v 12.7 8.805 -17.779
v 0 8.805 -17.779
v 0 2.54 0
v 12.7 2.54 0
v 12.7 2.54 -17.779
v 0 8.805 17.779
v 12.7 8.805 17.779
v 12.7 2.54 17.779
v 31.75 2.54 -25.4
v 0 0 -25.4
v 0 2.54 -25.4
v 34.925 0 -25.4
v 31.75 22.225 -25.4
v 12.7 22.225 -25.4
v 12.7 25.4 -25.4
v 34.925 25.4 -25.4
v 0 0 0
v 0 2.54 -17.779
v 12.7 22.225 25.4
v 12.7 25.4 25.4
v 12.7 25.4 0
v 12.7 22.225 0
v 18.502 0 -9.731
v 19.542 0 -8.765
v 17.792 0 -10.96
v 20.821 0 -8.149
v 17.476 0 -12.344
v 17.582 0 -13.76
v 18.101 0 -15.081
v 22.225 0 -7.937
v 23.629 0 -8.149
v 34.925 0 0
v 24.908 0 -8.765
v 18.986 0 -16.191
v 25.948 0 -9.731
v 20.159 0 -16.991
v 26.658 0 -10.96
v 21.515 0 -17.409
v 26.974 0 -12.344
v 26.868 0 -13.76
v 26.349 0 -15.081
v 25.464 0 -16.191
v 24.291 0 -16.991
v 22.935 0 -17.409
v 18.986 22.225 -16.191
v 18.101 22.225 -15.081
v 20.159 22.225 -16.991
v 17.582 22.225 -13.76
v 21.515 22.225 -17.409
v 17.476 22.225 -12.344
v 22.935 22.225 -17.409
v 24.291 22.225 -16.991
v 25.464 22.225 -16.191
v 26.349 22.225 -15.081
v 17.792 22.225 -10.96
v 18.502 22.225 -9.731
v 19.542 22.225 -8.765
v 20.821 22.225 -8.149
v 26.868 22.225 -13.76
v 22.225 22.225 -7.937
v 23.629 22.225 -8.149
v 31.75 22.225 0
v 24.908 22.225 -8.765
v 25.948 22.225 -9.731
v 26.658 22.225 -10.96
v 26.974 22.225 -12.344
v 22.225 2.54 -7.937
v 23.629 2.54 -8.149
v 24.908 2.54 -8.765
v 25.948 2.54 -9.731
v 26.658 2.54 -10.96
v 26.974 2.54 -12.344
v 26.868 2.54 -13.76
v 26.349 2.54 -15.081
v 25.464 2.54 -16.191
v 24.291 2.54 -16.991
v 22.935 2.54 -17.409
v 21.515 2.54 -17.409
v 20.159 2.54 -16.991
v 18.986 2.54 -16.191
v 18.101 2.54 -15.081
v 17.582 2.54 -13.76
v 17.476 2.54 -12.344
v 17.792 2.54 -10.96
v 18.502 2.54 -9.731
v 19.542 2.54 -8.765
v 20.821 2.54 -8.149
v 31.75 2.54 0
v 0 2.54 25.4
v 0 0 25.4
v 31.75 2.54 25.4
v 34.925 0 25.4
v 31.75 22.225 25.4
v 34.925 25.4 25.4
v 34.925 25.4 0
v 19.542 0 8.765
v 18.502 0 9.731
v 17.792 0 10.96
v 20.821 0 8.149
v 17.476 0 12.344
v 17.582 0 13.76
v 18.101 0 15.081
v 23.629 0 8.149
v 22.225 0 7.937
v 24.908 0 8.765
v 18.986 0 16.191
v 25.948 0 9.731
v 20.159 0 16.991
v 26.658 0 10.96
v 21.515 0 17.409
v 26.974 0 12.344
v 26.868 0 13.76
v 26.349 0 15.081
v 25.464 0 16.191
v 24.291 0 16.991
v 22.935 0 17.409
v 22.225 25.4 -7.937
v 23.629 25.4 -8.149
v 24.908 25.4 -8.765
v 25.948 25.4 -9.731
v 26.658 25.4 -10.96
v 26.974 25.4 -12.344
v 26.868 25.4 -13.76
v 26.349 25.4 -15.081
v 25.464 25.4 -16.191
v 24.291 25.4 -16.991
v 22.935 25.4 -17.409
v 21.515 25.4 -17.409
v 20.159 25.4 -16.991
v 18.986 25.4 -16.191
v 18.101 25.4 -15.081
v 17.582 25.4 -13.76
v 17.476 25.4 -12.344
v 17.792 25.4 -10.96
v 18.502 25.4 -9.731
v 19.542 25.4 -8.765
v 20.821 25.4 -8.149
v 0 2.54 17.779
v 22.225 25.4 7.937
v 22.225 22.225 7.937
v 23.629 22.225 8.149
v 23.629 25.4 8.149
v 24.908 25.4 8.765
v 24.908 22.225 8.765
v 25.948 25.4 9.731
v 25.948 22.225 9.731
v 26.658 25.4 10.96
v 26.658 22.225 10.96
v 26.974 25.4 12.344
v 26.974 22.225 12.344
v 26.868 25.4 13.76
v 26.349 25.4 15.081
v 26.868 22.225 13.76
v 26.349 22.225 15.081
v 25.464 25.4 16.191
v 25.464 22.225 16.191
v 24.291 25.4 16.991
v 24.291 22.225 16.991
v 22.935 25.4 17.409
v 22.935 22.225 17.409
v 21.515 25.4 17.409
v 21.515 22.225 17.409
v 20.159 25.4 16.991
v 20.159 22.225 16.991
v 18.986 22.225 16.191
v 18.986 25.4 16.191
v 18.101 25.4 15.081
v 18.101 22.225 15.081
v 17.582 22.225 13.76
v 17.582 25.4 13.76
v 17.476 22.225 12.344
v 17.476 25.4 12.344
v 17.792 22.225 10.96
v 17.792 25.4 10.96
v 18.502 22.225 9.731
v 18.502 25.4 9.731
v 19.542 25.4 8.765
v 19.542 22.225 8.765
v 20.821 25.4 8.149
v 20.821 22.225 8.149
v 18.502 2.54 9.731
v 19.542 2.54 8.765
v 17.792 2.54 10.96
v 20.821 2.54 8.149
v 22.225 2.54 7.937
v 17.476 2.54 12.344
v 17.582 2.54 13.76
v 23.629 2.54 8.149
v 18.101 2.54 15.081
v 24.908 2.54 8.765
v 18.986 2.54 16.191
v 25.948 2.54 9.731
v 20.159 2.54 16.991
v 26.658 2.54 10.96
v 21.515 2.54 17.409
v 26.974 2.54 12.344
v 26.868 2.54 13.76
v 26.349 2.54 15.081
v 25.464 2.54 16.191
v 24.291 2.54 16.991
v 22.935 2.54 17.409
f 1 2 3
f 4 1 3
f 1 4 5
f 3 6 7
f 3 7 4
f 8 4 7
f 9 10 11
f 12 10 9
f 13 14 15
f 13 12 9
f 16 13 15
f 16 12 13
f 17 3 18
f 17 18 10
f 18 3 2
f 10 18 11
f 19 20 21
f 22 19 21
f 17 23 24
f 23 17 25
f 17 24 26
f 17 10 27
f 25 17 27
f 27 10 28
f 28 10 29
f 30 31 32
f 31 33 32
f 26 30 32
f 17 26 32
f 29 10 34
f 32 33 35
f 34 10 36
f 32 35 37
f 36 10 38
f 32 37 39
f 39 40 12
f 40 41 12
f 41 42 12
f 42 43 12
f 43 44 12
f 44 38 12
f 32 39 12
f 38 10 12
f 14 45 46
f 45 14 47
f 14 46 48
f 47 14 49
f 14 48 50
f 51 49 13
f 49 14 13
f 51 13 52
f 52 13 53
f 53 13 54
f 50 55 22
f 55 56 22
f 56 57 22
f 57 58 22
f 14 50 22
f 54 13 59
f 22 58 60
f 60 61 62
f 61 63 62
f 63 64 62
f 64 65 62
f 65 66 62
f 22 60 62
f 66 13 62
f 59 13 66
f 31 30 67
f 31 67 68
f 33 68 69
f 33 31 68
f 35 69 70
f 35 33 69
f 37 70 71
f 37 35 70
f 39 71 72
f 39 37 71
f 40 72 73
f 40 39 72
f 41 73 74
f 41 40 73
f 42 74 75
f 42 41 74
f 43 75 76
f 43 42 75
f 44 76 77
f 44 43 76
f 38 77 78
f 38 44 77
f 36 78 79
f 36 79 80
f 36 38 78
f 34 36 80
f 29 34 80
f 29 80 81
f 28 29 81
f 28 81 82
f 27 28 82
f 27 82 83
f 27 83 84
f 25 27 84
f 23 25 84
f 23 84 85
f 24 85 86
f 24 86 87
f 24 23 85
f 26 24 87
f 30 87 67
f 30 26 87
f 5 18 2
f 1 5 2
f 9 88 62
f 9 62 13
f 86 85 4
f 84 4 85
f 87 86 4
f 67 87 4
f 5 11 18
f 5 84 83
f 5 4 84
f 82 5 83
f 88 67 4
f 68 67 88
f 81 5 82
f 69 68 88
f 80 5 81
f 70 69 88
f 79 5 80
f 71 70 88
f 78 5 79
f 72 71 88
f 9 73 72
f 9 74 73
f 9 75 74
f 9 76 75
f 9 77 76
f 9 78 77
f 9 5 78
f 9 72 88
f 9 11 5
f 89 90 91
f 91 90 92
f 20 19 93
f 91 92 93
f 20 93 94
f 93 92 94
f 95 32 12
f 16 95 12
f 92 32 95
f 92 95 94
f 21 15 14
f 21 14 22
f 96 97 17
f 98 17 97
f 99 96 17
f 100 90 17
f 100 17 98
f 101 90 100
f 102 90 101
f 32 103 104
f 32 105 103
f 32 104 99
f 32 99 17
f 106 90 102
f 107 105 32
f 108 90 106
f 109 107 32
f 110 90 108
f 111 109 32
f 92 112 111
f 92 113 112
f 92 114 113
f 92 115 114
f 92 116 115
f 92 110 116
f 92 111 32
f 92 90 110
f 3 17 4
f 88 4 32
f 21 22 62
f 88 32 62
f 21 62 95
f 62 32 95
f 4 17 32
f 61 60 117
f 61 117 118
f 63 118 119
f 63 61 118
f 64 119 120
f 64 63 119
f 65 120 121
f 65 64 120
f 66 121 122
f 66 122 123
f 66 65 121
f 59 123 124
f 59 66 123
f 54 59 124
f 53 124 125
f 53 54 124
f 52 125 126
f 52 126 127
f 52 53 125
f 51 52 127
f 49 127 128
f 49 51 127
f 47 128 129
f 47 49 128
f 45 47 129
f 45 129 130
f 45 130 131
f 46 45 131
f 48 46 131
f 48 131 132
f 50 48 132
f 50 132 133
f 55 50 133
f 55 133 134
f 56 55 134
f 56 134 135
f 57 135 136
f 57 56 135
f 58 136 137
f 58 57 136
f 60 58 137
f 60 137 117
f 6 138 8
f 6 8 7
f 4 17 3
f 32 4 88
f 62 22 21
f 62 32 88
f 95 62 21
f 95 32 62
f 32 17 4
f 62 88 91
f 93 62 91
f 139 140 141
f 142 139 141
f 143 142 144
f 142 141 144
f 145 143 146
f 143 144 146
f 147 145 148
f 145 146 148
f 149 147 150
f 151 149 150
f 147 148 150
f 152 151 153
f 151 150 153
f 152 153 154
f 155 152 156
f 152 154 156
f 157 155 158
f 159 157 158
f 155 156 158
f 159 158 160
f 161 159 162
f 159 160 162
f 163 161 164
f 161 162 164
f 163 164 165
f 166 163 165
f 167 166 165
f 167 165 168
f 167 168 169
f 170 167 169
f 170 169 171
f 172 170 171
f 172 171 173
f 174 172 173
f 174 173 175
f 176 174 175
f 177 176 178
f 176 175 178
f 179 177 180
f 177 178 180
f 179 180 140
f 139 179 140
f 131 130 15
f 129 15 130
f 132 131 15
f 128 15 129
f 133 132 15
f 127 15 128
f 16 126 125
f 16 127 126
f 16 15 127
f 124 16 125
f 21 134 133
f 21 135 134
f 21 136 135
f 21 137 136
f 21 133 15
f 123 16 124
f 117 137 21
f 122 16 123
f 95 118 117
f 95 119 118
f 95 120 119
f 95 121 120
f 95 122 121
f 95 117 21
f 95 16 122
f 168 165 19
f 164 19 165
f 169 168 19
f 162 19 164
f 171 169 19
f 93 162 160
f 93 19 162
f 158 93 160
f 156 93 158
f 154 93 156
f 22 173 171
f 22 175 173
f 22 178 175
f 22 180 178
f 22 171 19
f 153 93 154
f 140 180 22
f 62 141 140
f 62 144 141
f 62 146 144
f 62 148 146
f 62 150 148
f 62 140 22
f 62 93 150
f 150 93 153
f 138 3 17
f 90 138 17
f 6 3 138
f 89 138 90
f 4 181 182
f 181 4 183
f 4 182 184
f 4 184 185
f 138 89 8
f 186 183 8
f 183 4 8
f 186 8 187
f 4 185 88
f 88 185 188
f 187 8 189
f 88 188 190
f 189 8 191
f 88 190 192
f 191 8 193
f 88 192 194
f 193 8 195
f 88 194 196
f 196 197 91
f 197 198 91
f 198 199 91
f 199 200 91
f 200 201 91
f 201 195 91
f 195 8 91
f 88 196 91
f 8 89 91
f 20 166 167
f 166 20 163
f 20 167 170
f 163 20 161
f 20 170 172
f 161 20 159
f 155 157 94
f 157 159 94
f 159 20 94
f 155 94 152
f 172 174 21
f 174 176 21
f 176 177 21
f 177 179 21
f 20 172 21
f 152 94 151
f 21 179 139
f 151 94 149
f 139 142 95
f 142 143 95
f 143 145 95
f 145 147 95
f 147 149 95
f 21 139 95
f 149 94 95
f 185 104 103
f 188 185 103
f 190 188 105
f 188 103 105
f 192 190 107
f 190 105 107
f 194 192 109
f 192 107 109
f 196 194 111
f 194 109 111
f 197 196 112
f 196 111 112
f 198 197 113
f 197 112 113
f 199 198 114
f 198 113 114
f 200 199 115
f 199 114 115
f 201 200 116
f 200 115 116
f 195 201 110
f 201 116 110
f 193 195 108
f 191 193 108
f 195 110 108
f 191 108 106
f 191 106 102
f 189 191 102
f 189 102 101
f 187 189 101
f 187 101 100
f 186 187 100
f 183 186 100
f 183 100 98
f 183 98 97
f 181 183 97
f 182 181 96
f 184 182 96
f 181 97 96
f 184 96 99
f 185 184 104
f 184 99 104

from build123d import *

# Parameters (mm, degrees)
SKETCH1_W           = 31.75
SKETCH1_H           = 25.4
SKETCH1_R           = 4.7625
BOSS_EXTRUDE1_DEPTH = 2.54
SKETCH1_3_W         = 12.7
SKETCH1_3_H         = 17.655412268
BOSS_EXTRUDE2_DEPTH = 2.54
SKETCH1_4_W         = 3.175
SKETCH1_4_H         = 25.4
BOSS_EXTRUDE3_DEPTH = 25.4
SKETCH2_W           = 25.4
SKETCH2_H           = 3.175
BOSS_EXTRUDE4_DEPTH = 19.05
CUT_EXTRUDE1_START  = -3.175
SKETCH4_R           = 4.7625
CUT_EXTRUDE1_DEPTH  = 3.175
BOSS_EXTRUDE5_DEPTH = 12.7


with BuildPart() as part:
    # Sketch1 → Boss-Extrude1 (new body)
    with BuildSketch(Plane(origin=(0, 0, 0), x_dir=(1, 0, 0), z_dir=(0, 1, 0))):
        with Locations((15.875, 12.7)):
            Rectangle(SKETCH1_W, SKETCH1_H)
        with Locations((22.225, 12.7)):
            Circle(SKETCH1_R, mode=Mode.SUBTRACT)
    extrude(amount=BOSS_EXTRUDE1_DEPTH)

    # Sketch1<3> → Boss-Extrude2 (add)
    with BuildSketch(Plane(origin=(0, 0, 0), x_dir=(1, 0, 0), z_dir=(0, 1, 0))):
        with Locations((6.35, 8.827706134)):
            Rectangle(SKETCH1_3_W, SKETCH1_3_H)
    extrude(amount=BOSS_EXTRUDE2_DEPTH)

    # Sketch1<4> → Boss-Extrude3 (add)
    with BuildSketch(Plane(origin=(0, 0, 0), x_dir=(1, 0, 0), z_dir=(0, 1, 0))):
        with Locations((33.3375, 12.7)):
            Rectangle(SKETCH1_4_W, SKETCH1_4_H)
    extrude(amount=BOSS_EXTRUDE3_DEPTH)

    # Sketch2 → Boss-Extrude4 (add)
    with BuildSketch(Plane.ZY.offset(-31.75)):
        with Locations((-12.7, 23.8125)):
            Rectangle(SKETCH2_W, SKETCH2_H)
    extrude(amount=BOSS_EXTRUDE4_DEPTH)

    # Sketch4 → Cut-Extrude1 (cut)
    with BuildSketch(Plane(origin=(0, 25.4, 0), x_dir=(1, 0, 0), z_dir=(0, 1, 0)).offset(CUT_EXTRUDE1_START)):
        with Locations((22.225, 12.7)):
            Circle(SKETCH4_R)
    extrude(amount=CUT_EXTRUDE1_DEPTH, mode=Mode.SUBTRACT)

    # Sketch16 → Boss-Extrude5 (add)
    with BuildSketch(Plane.ZY):
        Polygon((-17.778601637, 2.54), (-17.778601637, 8.805137728), (0, 2.54), align=None)
    extrude(amount=-BOSS_EXTRUDE5_DEPTH)


with BuildPart() as body_2:
    # Mirror3: mirrored copy
    add(part.part.mirror(Plane(origin=(0, 2.54, 0), x_dir=(1, 0, 0), z_dir=(0, 0, -1))))


solid = Compound([part.part, body_2.part])
